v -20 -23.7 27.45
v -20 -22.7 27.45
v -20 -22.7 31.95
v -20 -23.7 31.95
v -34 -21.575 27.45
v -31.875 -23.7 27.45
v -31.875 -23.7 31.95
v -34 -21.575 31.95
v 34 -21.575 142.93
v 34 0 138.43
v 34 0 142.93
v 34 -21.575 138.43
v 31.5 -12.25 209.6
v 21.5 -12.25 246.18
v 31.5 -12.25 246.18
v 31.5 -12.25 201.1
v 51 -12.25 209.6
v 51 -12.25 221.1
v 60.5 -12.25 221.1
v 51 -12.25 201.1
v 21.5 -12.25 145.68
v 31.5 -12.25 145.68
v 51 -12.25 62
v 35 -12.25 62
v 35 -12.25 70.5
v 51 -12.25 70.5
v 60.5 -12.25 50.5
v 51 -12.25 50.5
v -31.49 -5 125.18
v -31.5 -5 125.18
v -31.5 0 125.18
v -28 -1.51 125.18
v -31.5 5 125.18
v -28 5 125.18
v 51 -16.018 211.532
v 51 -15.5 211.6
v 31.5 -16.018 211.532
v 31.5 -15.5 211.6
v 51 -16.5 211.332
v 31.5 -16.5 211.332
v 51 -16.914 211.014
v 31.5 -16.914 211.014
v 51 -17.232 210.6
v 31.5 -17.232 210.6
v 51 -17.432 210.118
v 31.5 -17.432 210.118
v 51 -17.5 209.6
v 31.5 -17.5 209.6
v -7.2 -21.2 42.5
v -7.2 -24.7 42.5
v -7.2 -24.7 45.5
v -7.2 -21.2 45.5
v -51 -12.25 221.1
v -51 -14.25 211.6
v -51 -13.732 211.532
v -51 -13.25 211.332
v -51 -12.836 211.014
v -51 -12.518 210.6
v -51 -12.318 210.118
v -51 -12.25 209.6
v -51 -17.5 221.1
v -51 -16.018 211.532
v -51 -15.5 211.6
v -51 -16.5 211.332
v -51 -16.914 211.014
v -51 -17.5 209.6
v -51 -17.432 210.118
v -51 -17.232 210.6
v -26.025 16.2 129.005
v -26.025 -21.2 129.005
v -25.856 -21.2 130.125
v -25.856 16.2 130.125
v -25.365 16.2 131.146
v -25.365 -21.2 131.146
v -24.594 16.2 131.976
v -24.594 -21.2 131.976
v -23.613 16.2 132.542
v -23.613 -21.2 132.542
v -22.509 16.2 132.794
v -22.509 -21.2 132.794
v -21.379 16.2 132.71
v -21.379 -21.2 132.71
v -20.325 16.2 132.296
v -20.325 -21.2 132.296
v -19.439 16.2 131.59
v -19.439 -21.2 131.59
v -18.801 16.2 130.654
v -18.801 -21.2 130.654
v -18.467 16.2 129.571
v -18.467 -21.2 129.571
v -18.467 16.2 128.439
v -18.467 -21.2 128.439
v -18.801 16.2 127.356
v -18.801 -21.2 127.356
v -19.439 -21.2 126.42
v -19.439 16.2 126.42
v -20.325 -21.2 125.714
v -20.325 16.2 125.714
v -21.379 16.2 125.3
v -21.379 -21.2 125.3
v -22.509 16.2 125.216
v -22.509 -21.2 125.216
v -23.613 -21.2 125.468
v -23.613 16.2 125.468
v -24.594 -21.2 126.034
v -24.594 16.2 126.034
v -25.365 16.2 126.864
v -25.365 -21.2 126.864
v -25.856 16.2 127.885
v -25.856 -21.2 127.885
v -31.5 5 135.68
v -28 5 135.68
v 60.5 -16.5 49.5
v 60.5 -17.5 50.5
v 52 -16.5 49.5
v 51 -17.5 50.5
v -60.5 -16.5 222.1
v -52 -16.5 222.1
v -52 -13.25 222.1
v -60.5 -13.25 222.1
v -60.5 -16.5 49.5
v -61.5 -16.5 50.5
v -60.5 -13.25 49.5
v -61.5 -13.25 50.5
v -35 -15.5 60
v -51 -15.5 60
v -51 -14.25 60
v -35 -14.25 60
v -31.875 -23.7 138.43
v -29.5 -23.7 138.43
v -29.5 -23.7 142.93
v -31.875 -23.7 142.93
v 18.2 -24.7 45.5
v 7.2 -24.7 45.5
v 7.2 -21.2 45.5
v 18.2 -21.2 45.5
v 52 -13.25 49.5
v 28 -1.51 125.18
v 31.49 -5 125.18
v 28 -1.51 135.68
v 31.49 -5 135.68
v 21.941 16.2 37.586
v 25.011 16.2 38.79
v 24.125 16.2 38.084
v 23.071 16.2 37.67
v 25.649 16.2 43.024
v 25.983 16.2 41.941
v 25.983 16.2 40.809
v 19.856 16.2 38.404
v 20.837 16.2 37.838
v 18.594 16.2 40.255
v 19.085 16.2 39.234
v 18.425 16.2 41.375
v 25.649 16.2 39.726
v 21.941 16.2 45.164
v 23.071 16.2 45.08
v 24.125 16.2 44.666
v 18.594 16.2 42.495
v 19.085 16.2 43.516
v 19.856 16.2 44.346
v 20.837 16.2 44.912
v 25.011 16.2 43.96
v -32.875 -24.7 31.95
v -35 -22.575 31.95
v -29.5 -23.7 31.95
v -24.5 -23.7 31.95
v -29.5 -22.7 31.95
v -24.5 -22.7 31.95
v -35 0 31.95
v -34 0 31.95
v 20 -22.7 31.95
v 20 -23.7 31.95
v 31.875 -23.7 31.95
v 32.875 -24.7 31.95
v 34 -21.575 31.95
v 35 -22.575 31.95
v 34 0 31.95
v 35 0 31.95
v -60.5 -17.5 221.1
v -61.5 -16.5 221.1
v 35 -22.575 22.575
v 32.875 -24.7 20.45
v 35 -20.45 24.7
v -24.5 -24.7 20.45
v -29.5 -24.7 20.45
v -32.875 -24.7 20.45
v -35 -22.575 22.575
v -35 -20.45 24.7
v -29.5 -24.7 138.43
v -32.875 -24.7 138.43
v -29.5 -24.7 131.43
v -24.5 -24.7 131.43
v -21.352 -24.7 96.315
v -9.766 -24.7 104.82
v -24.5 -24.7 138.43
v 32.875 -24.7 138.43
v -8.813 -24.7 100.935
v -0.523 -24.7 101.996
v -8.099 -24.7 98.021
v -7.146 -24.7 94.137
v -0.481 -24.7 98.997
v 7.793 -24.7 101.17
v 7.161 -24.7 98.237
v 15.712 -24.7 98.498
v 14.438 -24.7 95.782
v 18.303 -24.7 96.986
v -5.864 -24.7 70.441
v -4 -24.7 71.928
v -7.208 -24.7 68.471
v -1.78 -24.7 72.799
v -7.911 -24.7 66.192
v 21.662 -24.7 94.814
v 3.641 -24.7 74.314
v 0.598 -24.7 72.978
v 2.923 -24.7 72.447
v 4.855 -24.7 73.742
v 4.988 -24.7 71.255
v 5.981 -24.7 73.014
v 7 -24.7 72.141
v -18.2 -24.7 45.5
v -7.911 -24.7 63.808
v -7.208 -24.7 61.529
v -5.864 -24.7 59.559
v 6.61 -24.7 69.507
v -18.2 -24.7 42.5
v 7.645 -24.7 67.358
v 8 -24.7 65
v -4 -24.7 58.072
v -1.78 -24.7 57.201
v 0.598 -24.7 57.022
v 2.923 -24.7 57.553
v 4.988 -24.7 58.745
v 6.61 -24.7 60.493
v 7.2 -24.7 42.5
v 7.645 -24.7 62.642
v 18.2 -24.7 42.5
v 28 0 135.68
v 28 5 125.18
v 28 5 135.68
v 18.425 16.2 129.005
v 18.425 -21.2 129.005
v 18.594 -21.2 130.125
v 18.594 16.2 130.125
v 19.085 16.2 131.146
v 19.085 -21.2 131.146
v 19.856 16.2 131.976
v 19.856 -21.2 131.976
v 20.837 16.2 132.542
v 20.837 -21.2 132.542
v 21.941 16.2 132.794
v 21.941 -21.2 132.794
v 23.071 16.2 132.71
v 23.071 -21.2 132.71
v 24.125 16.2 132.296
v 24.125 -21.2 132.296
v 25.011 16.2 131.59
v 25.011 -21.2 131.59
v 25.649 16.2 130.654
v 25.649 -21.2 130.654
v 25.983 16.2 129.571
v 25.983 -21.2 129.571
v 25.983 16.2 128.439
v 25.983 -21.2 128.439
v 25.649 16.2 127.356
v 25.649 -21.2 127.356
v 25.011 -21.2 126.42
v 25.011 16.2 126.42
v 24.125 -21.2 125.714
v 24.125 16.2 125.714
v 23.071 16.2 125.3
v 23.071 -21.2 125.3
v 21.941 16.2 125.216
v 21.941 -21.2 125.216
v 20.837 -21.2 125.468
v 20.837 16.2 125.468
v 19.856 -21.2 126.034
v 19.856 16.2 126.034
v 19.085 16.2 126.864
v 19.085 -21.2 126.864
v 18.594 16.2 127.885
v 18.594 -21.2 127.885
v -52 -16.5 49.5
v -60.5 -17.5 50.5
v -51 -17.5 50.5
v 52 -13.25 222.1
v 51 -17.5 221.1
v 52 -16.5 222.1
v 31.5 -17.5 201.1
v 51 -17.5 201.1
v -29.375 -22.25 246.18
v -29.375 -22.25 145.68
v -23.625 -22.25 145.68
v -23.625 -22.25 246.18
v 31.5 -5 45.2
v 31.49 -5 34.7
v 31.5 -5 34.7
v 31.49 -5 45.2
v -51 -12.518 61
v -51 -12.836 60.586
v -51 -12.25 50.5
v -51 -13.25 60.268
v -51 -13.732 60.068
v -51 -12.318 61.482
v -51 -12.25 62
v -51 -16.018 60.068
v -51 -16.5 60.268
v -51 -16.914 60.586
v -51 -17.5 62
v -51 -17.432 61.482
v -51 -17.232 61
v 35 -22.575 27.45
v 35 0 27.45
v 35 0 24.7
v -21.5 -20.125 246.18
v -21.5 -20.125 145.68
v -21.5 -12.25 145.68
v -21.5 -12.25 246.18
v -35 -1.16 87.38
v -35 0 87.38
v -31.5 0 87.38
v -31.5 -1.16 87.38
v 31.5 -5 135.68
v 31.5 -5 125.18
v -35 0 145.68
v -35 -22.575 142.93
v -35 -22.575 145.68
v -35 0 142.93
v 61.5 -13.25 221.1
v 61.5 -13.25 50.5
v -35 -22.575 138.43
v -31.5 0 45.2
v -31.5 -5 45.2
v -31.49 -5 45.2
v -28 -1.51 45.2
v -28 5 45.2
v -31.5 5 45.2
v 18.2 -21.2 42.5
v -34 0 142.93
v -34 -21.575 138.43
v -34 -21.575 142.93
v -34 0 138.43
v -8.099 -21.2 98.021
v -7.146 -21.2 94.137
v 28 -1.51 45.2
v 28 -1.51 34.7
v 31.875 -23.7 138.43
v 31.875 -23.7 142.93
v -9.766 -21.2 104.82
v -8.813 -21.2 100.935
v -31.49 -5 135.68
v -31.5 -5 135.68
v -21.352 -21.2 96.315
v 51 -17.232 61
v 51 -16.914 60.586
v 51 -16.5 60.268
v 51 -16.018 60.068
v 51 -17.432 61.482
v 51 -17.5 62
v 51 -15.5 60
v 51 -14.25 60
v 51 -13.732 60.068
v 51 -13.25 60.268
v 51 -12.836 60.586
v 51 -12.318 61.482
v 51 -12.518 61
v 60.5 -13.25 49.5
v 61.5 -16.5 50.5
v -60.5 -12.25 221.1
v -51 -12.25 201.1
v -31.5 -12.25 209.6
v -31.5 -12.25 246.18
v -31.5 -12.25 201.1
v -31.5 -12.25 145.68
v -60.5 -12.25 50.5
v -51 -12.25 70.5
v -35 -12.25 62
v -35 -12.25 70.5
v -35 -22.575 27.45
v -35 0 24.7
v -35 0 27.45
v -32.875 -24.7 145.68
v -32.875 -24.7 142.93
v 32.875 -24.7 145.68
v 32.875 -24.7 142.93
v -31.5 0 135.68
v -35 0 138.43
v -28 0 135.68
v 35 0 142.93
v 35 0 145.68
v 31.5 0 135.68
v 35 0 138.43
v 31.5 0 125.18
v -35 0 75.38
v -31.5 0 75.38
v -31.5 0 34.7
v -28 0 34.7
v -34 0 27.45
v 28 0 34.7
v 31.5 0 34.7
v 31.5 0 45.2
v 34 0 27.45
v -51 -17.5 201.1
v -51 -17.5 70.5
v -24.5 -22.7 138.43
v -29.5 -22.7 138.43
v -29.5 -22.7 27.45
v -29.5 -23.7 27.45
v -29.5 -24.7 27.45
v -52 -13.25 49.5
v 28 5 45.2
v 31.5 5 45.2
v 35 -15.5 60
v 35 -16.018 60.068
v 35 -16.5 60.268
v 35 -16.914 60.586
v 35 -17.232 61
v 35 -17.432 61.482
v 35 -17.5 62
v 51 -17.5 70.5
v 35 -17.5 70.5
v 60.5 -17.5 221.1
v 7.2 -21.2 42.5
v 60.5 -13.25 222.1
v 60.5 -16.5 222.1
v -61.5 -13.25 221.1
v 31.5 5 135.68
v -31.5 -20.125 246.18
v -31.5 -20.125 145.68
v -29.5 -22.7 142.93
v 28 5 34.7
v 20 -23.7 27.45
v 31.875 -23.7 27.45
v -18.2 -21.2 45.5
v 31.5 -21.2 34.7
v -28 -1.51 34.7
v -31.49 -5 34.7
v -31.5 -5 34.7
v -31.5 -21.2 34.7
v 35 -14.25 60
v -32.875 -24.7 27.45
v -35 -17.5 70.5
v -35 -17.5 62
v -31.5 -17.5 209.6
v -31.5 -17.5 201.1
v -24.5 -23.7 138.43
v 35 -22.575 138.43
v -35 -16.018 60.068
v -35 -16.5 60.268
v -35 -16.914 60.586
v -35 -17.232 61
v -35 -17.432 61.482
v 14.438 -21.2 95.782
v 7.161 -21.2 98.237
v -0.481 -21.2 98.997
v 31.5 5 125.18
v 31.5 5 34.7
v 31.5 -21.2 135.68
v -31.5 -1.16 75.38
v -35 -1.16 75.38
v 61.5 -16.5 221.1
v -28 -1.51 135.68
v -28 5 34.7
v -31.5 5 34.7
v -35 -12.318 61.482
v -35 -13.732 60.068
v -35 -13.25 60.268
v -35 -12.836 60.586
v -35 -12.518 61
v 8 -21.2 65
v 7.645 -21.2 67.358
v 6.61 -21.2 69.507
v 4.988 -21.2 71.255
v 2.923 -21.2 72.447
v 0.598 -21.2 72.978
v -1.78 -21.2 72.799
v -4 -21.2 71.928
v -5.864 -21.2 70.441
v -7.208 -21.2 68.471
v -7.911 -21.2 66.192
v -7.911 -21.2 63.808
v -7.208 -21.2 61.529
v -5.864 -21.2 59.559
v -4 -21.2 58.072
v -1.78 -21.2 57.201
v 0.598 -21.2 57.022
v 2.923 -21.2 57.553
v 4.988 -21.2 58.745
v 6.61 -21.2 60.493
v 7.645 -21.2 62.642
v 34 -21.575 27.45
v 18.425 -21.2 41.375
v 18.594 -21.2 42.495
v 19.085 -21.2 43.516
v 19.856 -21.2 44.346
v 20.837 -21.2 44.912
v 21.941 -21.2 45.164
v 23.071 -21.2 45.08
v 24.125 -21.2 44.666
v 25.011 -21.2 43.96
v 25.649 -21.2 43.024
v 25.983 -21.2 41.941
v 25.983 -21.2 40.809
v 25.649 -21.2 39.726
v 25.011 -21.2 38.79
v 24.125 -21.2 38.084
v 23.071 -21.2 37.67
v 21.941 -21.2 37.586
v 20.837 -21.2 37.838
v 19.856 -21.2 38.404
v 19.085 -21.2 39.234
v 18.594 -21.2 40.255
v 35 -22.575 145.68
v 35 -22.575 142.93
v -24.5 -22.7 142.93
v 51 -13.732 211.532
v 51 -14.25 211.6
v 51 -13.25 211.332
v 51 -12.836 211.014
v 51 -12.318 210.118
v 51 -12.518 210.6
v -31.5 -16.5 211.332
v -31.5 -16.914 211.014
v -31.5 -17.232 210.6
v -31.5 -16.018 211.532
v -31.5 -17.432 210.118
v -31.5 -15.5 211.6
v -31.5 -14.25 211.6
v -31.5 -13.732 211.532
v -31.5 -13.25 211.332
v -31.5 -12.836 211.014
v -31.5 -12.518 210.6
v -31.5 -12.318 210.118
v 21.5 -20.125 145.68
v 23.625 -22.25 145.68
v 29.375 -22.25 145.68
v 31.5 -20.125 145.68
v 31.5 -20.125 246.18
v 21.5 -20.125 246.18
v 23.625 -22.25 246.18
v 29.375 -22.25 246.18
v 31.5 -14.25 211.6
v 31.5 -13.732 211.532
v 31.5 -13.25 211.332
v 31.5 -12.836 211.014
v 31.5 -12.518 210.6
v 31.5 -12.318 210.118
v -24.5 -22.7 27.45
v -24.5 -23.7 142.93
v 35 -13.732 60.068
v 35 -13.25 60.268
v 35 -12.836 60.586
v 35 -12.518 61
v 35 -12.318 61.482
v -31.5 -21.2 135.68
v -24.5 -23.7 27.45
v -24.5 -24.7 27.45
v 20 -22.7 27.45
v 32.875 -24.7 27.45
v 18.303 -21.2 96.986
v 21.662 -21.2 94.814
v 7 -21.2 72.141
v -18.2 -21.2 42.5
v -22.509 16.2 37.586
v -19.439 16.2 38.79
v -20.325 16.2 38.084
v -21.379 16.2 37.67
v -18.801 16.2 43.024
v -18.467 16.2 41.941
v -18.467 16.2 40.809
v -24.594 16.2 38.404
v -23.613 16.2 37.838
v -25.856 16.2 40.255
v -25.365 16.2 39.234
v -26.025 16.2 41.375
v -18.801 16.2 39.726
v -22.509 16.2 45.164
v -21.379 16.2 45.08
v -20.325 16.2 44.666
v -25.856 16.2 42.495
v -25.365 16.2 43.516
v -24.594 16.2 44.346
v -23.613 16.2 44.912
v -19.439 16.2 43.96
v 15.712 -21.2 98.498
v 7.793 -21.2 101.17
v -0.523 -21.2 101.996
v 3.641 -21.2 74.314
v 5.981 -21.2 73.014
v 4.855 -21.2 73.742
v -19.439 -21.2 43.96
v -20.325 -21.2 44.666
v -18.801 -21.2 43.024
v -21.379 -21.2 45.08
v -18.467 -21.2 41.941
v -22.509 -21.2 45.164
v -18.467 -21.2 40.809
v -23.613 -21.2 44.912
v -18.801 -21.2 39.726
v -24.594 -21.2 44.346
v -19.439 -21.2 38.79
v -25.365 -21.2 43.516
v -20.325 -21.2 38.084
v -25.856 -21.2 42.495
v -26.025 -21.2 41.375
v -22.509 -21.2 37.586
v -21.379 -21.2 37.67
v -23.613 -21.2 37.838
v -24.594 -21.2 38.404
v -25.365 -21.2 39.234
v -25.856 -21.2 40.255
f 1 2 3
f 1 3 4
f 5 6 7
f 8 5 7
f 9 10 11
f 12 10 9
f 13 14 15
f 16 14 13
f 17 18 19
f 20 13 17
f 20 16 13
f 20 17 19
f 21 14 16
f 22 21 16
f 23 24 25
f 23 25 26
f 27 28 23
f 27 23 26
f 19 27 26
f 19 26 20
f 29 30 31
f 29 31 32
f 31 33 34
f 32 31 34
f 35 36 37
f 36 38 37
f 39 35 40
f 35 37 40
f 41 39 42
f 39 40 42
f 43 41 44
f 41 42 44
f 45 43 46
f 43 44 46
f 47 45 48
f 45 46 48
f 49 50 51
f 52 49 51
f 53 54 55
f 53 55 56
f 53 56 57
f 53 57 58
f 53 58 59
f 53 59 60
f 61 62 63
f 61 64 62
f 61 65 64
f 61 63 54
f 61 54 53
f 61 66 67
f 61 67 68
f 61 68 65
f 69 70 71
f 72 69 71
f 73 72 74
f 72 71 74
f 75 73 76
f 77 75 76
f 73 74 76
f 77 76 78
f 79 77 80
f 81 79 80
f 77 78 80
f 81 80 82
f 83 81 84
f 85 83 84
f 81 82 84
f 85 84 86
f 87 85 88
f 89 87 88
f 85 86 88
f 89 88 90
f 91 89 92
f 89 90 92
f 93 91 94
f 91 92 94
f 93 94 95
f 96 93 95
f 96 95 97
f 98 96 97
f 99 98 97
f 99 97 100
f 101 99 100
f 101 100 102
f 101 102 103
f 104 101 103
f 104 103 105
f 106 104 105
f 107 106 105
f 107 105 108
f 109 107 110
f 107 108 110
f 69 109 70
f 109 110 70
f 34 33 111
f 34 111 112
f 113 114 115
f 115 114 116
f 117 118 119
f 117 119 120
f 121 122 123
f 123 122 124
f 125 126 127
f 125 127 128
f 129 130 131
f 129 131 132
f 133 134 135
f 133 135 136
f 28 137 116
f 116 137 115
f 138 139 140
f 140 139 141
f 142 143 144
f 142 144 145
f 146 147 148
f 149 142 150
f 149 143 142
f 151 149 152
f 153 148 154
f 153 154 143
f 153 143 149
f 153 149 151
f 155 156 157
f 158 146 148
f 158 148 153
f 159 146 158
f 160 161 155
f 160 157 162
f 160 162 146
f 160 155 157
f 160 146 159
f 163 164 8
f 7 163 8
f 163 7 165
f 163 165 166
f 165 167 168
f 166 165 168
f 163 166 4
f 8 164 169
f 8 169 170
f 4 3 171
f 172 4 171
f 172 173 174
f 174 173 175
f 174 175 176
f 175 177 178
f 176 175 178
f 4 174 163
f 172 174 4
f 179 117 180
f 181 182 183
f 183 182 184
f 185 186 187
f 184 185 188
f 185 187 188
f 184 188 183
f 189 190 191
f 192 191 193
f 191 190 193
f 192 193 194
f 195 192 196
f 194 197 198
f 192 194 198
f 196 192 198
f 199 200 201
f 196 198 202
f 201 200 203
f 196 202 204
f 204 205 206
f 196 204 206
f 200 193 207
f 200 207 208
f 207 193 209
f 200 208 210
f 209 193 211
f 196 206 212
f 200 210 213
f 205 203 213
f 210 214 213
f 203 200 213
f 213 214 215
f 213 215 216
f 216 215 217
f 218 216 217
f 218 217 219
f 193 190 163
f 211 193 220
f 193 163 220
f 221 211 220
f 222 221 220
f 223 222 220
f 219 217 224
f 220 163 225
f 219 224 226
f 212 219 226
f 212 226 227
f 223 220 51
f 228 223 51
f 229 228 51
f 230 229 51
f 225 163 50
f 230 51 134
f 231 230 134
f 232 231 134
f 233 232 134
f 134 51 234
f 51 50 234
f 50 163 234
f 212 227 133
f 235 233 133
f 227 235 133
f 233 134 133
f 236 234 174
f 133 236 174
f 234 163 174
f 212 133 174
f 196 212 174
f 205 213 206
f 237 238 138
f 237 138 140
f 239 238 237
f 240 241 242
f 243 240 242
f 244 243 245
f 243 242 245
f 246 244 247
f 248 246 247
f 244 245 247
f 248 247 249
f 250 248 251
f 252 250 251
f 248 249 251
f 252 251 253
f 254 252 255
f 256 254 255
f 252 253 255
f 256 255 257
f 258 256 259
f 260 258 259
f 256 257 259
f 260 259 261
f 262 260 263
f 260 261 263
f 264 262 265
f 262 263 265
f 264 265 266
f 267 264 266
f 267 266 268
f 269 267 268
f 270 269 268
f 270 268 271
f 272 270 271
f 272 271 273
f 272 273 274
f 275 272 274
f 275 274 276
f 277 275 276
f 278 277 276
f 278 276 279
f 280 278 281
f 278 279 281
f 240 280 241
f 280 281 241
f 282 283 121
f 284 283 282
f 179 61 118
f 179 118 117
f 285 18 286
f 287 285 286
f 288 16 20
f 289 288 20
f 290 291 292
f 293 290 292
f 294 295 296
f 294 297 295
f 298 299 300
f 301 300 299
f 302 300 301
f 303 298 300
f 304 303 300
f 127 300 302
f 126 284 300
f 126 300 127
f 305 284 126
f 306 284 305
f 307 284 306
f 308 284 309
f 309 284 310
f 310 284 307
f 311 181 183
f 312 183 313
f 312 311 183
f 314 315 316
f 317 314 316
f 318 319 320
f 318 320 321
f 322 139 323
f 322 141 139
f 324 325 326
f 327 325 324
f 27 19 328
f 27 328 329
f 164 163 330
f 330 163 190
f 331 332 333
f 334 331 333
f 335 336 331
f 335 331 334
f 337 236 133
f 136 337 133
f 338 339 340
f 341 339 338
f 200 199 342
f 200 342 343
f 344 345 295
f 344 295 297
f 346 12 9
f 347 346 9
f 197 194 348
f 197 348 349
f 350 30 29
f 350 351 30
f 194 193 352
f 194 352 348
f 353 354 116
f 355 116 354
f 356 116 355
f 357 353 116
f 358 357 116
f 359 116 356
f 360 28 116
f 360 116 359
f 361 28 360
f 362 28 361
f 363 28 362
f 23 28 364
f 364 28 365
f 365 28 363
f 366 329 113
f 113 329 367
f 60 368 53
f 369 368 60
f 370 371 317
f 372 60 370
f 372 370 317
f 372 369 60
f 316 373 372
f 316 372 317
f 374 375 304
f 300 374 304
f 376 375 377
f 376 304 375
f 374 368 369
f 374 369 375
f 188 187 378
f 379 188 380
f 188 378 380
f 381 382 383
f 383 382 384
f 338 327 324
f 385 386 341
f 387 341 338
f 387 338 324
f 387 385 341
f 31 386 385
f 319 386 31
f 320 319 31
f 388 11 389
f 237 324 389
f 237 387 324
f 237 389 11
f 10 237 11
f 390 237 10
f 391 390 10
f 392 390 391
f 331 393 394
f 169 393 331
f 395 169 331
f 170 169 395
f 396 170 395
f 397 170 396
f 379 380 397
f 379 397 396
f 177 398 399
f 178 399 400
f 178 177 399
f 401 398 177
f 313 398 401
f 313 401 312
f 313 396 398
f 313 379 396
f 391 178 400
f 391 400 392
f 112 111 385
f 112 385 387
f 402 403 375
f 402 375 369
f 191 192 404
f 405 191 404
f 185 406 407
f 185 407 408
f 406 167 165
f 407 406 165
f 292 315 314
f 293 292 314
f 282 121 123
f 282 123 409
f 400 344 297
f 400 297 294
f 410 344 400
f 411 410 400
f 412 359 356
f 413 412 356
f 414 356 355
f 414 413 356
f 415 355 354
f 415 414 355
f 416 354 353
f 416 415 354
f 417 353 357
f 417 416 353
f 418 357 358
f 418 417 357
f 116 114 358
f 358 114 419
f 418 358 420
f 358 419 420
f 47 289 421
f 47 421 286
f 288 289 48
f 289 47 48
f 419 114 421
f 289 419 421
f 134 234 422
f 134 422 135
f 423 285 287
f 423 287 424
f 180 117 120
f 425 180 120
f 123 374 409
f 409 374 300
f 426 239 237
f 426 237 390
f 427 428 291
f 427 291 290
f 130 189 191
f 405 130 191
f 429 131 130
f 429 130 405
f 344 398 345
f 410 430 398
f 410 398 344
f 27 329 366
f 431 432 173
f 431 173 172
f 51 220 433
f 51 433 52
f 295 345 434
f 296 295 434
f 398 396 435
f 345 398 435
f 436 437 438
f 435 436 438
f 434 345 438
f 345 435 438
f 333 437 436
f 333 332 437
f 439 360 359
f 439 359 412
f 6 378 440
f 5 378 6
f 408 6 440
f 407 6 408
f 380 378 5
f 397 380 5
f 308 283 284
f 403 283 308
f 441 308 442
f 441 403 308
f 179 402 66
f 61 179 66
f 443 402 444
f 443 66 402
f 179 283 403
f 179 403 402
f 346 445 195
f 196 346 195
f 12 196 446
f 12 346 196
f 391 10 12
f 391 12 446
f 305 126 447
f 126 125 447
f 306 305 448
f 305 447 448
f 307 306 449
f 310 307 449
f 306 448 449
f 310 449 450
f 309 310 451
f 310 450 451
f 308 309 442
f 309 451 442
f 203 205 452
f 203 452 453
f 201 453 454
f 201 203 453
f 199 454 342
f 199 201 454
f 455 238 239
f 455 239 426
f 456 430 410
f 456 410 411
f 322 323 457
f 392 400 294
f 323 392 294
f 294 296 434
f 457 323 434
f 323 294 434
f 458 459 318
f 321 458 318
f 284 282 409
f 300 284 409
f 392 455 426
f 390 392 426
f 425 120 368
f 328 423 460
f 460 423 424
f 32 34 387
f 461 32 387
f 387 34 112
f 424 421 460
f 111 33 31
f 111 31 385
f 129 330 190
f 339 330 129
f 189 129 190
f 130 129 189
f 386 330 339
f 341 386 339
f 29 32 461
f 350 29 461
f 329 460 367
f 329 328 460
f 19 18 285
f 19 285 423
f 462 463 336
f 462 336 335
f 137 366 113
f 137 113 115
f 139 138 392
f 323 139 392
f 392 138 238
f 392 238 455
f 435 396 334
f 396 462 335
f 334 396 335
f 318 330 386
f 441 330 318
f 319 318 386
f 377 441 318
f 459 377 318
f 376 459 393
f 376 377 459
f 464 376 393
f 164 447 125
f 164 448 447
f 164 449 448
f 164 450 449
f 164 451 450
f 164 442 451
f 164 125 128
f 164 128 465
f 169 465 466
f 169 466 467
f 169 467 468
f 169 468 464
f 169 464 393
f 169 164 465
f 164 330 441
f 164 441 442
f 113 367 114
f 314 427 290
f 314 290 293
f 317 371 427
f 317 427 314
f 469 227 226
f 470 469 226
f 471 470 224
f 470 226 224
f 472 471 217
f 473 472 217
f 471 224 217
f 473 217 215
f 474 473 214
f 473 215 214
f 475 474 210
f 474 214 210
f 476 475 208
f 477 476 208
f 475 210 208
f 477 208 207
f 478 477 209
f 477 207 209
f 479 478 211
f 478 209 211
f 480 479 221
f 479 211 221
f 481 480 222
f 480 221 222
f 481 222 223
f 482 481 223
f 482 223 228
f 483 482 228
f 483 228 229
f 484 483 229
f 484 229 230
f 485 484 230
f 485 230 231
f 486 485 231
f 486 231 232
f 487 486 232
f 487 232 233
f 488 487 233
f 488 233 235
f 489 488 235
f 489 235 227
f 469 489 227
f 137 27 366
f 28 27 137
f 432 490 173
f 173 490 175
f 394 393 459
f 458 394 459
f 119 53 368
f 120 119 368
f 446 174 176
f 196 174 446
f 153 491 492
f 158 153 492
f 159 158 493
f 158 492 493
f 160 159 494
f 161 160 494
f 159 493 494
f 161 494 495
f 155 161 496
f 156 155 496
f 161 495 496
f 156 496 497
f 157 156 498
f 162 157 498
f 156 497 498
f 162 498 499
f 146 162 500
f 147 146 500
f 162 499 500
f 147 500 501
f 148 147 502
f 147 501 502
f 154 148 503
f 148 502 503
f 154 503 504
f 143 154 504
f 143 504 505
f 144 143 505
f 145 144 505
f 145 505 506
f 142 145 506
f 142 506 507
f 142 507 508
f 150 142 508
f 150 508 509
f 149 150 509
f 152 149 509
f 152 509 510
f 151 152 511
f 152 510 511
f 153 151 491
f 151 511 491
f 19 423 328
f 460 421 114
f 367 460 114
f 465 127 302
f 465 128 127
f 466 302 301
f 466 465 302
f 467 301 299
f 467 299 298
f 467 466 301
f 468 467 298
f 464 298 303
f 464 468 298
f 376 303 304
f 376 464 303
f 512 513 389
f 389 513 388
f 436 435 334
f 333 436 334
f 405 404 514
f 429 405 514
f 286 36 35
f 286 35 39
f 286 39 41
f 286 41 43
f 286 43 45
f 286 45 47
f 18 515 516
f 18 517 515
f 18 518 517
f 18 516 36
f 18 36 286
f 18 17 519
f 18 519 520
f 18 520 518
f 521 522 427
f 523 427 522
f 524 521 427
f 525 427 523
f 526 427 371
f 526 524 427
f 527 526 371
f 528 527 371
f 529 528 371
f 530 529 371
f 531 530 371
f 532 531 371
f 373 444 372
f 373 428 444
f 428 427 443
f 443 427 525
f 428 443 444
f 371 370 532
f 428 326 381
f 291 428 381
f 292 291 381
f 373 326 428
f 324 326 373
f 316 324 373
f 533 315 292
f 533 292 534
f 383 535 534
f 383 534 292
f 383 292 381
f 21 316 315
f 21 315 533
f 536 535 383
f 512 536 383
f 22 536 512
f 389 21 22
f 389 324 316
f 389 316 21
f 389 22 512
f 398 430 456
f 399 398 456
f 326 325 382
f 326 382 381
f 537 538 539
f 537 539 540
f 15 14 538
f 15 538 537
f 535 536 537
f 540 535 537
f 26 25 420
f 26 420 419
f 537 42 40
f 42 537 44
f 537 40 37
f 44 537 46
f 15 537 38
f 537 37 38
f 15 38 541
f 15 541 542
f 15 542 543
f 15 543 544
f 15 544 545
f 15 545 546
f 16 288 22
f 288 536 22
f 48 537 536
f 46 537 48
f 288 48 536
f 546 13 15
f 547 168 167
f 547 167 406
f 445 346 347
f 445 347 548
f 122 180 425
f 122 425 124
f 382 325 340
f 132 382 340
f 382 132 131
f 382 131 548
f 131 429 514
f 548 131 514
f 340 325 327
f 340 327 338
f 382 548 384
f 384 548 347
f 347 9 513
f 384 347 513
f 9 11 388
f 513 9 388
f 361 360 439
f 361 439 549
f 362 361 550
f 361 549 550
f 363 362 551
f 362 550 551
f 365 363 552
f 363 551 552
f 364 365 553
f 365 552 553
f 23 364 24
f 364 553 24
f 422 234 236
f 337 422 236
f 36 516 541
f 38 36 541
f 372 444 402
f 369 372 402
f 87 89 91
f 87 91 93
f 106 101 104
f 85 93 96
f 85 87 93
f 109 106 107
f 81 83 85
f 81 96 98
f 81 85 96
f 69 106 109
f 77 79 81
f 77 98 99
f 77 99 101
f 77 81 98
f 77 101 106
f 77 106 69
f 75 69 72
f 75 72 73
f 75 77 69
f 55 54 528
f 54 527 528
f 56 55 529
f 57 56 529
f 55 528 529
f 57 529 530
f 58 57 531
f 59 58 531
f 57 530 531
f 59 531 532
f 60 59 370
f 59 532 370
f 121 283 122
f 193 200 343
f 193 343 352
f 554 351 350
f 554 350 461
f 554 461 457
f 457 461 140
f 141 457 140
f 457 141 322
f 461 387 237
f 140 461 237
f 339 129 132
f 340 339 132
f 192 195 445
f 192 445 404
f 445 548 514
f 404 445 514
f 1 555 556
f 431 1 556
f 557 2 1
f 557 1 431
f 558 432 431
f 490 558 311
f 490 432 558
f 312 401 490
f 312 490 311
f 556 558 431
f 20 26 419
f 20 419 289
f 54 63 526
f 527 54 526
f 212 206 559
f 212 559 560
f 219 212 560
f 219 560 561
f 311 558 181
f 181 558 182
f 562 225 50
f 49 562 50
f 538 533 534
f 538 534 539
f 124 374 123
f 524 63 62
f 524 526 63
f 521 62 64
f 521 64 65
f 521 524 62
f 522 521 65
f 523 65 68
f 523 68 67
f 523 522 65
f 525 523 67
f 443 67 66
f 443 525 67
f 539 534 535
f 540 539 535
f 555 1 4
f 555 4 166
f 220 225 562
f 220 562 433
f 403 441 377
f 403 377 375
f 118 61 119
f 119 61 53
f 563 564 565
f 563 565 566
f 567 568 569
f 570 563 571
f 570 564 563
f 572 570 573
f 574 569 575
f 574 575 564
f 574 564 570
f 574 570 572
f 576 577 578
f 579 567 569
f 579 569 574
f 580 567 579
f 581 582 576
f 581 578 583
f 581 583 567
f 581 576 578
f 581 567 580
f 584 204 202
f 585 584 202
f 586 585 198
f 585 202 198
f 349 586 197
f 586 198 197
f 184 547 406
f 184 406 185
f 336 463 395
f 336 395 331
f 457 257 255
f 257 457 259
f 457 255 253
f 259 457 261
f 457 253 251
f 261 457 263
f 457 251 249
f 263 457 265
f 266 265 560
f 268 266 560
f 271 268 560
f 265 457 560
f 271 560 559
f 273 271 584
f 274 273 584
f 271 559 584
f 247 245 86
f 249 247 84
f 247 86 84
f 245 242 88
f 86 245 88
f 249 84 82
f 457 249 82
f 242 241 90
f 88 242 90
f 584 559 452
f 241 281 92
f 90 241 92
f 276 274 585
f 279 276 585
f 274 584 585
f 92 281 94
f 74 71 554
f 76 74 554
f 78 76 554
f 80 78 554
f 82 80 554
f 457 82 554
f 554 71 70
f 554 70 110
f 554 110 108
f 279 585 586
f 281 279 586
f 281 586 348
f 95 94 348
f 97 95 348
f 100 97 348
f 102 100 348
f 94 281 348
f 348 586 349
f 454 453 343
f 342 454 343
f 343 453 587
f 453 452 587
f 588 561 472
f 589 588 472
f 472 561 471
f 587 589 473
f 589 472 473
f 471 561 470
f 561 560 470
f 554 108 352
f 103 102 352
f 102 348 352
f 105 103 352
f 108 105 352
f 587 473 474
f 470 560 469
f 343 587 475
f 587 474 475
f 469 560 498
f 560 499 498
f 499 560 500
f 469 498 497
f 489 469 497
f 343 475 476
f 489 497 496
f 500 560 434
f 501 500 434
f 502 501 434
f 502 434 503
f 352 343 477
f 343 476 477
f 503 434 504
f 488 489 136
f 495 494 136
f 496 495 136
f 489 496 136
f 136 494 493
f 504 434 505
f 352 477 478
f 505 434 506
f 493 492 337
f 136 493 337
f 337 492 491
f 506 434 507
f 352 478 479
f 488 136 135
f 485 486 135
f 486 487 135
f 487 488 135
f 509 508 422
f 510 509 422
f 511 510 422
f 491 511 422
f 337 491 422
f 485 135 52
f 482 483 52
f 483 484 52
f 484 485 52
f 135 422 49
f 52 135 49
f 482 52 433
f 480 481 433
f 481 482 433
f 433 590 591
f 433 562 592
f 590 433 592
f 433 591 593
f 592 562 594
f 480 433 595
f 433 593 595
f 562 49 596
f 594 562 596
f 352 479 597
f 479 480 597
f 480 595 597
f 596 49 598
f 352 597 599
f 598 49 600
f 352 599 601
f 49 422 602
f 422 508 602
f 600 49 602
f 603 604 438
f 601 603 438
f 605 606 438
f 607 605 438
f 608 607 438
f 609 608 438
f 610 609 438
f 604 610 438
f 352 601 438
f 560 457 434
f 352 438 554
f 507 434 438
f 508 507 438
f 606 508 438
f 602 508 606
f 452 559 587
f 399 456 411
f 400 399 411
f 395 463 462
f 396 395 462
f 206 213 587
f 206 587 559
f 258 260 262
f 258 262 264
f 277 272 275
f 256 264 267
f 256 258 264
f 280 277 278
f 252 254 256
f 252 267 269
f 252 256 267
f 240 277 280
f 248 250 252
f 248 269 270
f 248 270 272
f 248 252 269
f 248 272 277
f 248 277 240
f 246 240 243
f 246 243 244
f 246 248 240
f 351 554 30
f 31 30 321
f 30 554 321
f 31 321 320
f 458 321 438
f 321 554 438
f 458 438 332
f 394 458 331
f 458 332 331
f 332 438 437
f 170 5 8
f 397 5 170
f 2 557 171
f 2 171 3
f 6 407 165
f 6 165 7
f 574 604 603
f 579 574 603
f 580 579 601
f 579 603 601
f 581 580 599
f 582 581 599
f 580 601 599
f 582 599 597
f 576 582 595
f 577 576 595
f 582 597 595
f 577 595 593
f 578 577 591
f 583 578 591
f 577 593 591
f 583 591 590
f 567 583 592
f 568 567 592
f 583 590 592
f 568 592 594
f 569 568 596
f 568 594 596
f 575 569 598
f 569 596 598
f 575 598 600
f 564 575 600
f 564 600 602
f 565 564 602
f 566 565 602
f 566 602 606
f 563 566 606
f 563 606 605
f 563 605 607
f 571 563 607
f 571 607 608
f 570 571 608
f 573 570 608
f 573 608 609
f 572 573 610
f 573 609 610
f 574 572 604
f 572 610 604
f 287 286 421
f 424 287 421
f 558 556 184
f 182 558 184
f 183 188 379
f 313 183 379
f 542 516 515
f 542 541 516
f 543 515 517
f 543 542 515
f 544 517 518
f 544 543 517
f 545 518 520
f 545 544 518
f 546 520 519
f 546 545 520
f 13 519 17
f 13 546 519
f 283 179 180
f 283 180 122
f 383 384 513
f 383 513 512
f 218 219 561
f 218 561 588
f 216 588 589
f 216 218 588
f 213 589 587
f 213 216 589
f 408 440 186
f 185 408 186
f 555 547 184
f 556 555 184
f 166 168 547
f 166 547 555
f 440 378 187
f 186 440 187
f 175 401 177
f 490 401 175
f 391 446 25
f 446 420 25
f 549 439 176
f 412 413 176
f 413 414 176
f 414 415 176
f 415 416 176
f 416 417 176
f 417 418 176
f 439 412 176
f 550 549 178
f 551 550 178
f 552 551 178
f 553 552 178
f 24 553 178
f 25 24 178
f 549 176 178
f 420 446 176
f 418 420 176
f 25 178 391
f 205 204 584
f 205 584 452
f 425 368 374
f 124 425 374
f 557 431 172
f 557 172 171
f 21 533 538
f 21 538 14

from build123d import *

# Parameters (mm, degrees)
PAD011_DEPTH    = 4.5
PAD025_DEPTH    = 100.98
SKETCH030_R     = 3.8
PAD026_DEPTH    = 37.4
SKETCH031_W     = 3.5
SKETCH031_H     = 10.5
PAD027_DEPTH    = 10
CHAMFER009_SIZE = 3.49
SKETCH043_R     = 8
POCKET003_DEPTH = 5
PAD029_DEPTH    = 4.5
SKETCH032_W     = 70
SKETCH032_H     = 24.7
PAD028_DEPTH    = 10
SKETCH041_W     = 10
SKETCH041_H     = 10
PAD037_DEPTH    = 100.5
PAD039_DEPTH    = 5.25
FILLET001_R     = 2
CHAMFER015_SIZE = 1
PAD038_DEPTH    = 5.25
FILLET_R        = 2
CHAMFER014_SIZE = 1
PAD010_DEPTH    = 70
CHAMFER011_SIZE = 2.125
CHAMFER013_SIZE = 2.125
SKETCH045_R     = 5.5
SKETCH045_W     = 7
SKETCH045_H     = 12
POCKET005_DEPTH = 5
SKETCH046_W     = 11
SKETCH046_H     = 3
POCKET006_DEPTH = 5
POCKET007_DEPTH = 5


with BuildPart() as band:
    # Sketch013 → Pad011 (new body)
    with BuildSketch(Plane.XY.offset(27.45)):
        Polygon((-35, 0), (-35, -24.7), (35, -24.7), (35, 0), (34, 0), (34, -23.7), (20, -23.7), (20, -22.7), (-20, -22.7), (-20, -23.7), (-34, -23.7), (-34, 0), align=None)
    extrude(amount=PAD011_DEPTH)


with BuildPart() as boardcover:
    # Sketch029 → Pad025 (new body)
    with BuildSketch(Plane.XY.offset(34.7)):
        Polygon((-35, 0), (-35, -24.7), (35, -24.7), (35, 0), (31.5, 0), (31.5, -21.2), (-31.5, -21.2), (-31.5, 0), align=None)
    extrude(amount=PAD025_DEPTH)

    # Sketch030 (on Face6 of Pad025) → Pad026 (join)
    with BuildSketch(Plane(origin=(0, -21.2, 0), x_dir=(-1, 0, 0), z_dir=(0, 1, 0))):
        with Locations((-22.225, 129.005)):
            Circle(SKETCH030_R)
        with Locations((22.225, 129.005)):
            Circle(SKETCH030_R)
        with Locations((-22.225, 41.375)):
            Circle(SKETCH030_R)
        with Locations((22.225, 41.375)):
            Circle(SKETCH030_R)
    extrude(amount=PAD026_DEPTH)

    # Sketch031 → Pad027 (join)
    with BuildSketch(Plane.XZ.offset(-5)):
        with Locations((29.75, 130.43)):
            Rectangle(SKETCH031_W, SKETCH031_H)
        with Locations((-29.75, 130.43)):
            Rectangle(SKETCH031_W, SKETCH031_H)
        with Locations((29.75, 39.95)):
            Rectangle(SKETCH031_W, SKETCH031_H)
        with Locations((-29.75, 39.95)):
            Rectangle(SKETCH031_W, SKETCH031_H)
    extrude(amount=PAD027_DEPTH)

    # Chamfer009
    chamfer009_edges = [boardcover.edges().sort_by_distance(p)[0] for p in [
        (28, -5, 130.43),
        (28, -5, 39.95),
        (-28, -5, 130.43),
        (-28, -5, 39.95),
    ]]
    chamfer(chamfer009_edges, length=CHAMFER009_SIZE)

    # Sketch043 (on Face3 of Boolean005) → Pocket003 (cut)
    with BuildSketch(Plane(origin=(0, -24.7, 10), x_dir=(1, 0, 0), z_dir=(0, -1, 0))):
        with Locations((0, 55)):
            Circle(SKETCH043_R)
        with BuildLine():
            Line((3.641143, 64.313543), (18.302914, 86.985827))
            Line((18.302914, 86.985827), (21.661771, 84.813713))
            Line((21.661771, 84.813713), (7, 62.141428))
            ThreePointArc((7, 62.141428), (5.430286, 63.397142), (3.641143, 64.313543))
        make_face()
        with BuildLine():
            ThreePointArc((15.712042, 88.498235), (3.658274, 91.818705), (-8.813211, 90.935043))
            Line((-9.765986, 94.819914), (-8.813211, 90.935043))
            Line((-21.351919, 86.31544), (-9.765986, 94.819914))
            Line((-7.145856, 84.136519), (-21.351919, 86.31544))
            Line((-8.098631, 88.02139), (-7.145856, 84.136519))
            ThreePointArc((14.438081, 85.782167), (3.361649, 88.833405), (-8.098631, 88.02139))
            Line((15.712042, 88.498235), (14.438081, 85.782167))
        make_face()
    extrude(amount=-POCKET003_DEPTH, mode=Mode.SUBTRACT)


with BuildPart() as body015:
    # Sketch033 → Pad029 (new body)
    with BuildSketch(Plane.XY.offset(138.43)):
        Polygon((-35, 0), (-35, -24.7), (35, -24.7), (35, 0), (34, 0), (34, -23.7), (-34, -23.7), (-34, 0), align=None)
    extrude(amount=PAD029_DEPTH)


with BuildPart() as zip2:
    # Sketch032 → Pad028 (new body)
    with BuildSketch(Plane.XY.offset(135.68)):
        with Locations((0, -12.35)):
            Rectangle(SKETCH032_W, SKETCH032_H)
    extrude(amount=PAD028_DEPTH)

    # Boolean006: cut Body015
    add(body015.part, mode=Mode.SUBTRACT)

    # Sketch041 (on Face8 of Boolean006) → Pad037 (join)
    with BuildSketch(Plane.XY.offset(145.68)):
        with Locations((-26.5, -17.25)):
            Rectangle(SKETCH041_W, SKETCH041_H)
        with Locations((26.5, -17.25)):
            Rectangle(SKETCH041_W, SKETCH041_H)
    extrude(amount=PAD037_DEPTH)


with BuildPart() as body021:
    # Sketch050 → Pad039 (new body)
    with BuildSketch(Plane(origin=(0, -17.5, 0), x_dir=(-1, 0, 0), z_dir=(0, 1, 0))):
        Polygon((35, 70.5), (51, 70.5), (51, 201.1), (35, 201.1), (31.5, 201.1), (31.5, 211.6), (35, 211.6), (51, 211.6), (51, 222.1), (61.5, 222.1), (61.5, 49.5), (51, 49.5), (51, 60), (35, 60), align=None)
    extrude(amount=PAD039_DEPTH)

    # Fillet001
    fillet001_edges = [body021.edges().sort_by_distance(p)[0] for p in [
        (-43, -17.5, 211.6),
        (-33.25, -17.5, 211.6),
        (-43, -12.25, 211.6),
        (-33.25, -12.25, 211.6),
        (-43, -12.25, 60),
        (-43, -17.5, 60),
    ]]
    fillet(fillet001_edges, radius=FILLET001_R)

    # Chamfer015
    chamfer015_edges = [body021.edges().sort_by_distance(p)[0] for p in [
        (-51, -14.875, 222.1),
        (-56.25, -17.5, 222.1),
        (-56.25, -12.25, 222.1),
        (-61.5, -14.875, 222.1),
        (-61.5, -17.5, 135.8),
        (-61.5, -12.25, 135.8),
        (-51, -14.875, 49.5),
        (-56.25, -17.5, 49.5),
        (-56.25, -12.25, 49.5),
        (-61.5, -14.875, 49.5),
    ]]
    chamfer(chamfer015_edges, length=CHAMFER015_SIZE)


with BuildPart() as body020:
    # Sketch049 → Pad038 (new body)
    with BuildSketch(Plane.XZ.offset(12.25)):
        Polygon((35, 70.5), (51, 70.5), (51, 201.1), (35, 201.1), (31.5, 201.1), (31.5, 211.6), (35, 211.6), (51, 211.6), (51, 222.1), (61.5, 222.1), (61.5, 49.5), (51, 49.5), (51, 60), (35, 60), align=None)
    extrude(amount=PAD038_DEPTH)

    # Fillet
    fillet_edges = [body020.edges().sort_by_distance(p)[0] for p in [
        (43, -17.5, 60),
        (43, -12.25, 60),
        (33.25, -17.5, 211.6),
        (33.25, -12.25, 211.6),
        (43, -12.25, 211.6),
        (43, -17.5, 211.6),
    ]]
    fillet(fillet_edges, radius=FILLET_R)

    # Chamfer014
    chamfer014_edges = [body020.edges().sort_by_distance(p)[0] for p in [
        (51, -14.875, 222.1),
        (56.25, -12.25, 222.1),
        (56.25, -17.5, 222.1),
        (61.5, -17.5, 135.8),
        (61.5, -14.875, 222.1),
        (61.5, -12.25, 135.8),
        (61.5, -14.875, 49.5),
        (56.25, -12.25, 49.5),
        (56.25, -17.5, 49.5),
        (51, -14.875, 49.5),
    ]]
    chamfer(chamfer014_edges, length=CHAMFER014_SIZE)


with BuildPart() as plate:
    # Sketch012 → Pad010 (new body)
    with BuildSketch(Plane.YZ.offset(-35)):
        Polygon((-24.7, 20.45), (-20.45, 24.7), (0, 24.7), (0, 34.7), (-24.7, 34.7), align=None)
    extrude(amount=PAD010_DEPTH)

    # Boolean002: cut Band
    add(band.part, mode=Mode.SUBTRACT)

    # Boolean009: union BoardCover, Zip2
    add(boardcover.part)
    add(zip2.part)

    # Chamfer011
    chamfer011_edges = [plate.edges().sort_by_distance(p)[0] for p in [
        (-35, -24.7, 23.95),
        (-34, -23.7, 29.7),
        (-35, -24.7, 33.325),
        (-35, -24.7, 85.19),
        (-34, -23.7, 140.68),
        (-35, -24.7, 137.055),
        (-35, -24.7, 144.305),
        (35, -24.7, 144.305),
        (34, -23.7, 140.68),
        (35, -24.7, 137.055),
        (35, -24.7, 85.19),
        (35, -24.7, 33.325),
        (34, -23.7, 29.7),
        (35, -24.7, 23.95),
    ]]
    chamfer(chamfer011_edges, length=CHAMFER011_SIZE)

    # Chamfer013
    chamfer013_edges = [plate.edges().sort_by_distance(p)[0] for p in [
        (-31.5, -22.25, 195.93),
        (-21.5, -22.25, 195.93),
        (21.5, -22.25, 195.93),
        (31.5, -22.25, 195.93),
    ]]
    chamfer(chamfer013_edges, length=CHAMFER013_SIZE)

    # Sketch045 (on Face54 of Chamfer012) → Pocket005 (cut)
    with BuildSketch(Plane(origin=(-35, 0, 0), x_dir=(0, -1, 0), z_dir=(-1, 0, 0))):
        with Locations((-9.7, 101.7)):
            Circle(SKETCH045_R)
        with Locations((-2.34, 81.38)):
            Rectangle(SKETCH045_W, SKETCH045_H)
    extrude(amount=-POCKET005_DEPTH, mode=Mode.SUBTRACT)

    # Sketch046 (on Face97 of Pocket005) → Pocket006 (cut)
    with BuildSketch(Plane.XZ.offset(24.7)):
        with Locations((-12.7, 44)):
            Rectangle(SKETCH046_W, SKETCH046_H)
        with Locations((12.7, 44)):
            Rectangle(SKETCH046_W, SKETCH046_H)
    extrude(amount=-POCKET006_DEPTH, mode=Mode.SUBTRACT)

    # Sketch048 → Pocket007 (cut)
    with BuildSketch(Plane.YZ.offset(-24.5)):
        Polygon((-24.7, 138.43), (-24.7, 131.43), (-22.7, 138.43), (-22.7, 142.93), (-24.7, 142.93), align=None)
        Polygon((-22.7, 27.45), (-24.7, 20.45), (-24.7, 27.45), (-24.7, 31.95), (-22.7, 31.95), align=None)
    extrude(amount=-POCKET007_DEPTH, mode=Mode.SUBTRACT)

    # Boolean011: union Body021, Body020
    add(body021.part)
    add(body020.part)


solid = plate.part
